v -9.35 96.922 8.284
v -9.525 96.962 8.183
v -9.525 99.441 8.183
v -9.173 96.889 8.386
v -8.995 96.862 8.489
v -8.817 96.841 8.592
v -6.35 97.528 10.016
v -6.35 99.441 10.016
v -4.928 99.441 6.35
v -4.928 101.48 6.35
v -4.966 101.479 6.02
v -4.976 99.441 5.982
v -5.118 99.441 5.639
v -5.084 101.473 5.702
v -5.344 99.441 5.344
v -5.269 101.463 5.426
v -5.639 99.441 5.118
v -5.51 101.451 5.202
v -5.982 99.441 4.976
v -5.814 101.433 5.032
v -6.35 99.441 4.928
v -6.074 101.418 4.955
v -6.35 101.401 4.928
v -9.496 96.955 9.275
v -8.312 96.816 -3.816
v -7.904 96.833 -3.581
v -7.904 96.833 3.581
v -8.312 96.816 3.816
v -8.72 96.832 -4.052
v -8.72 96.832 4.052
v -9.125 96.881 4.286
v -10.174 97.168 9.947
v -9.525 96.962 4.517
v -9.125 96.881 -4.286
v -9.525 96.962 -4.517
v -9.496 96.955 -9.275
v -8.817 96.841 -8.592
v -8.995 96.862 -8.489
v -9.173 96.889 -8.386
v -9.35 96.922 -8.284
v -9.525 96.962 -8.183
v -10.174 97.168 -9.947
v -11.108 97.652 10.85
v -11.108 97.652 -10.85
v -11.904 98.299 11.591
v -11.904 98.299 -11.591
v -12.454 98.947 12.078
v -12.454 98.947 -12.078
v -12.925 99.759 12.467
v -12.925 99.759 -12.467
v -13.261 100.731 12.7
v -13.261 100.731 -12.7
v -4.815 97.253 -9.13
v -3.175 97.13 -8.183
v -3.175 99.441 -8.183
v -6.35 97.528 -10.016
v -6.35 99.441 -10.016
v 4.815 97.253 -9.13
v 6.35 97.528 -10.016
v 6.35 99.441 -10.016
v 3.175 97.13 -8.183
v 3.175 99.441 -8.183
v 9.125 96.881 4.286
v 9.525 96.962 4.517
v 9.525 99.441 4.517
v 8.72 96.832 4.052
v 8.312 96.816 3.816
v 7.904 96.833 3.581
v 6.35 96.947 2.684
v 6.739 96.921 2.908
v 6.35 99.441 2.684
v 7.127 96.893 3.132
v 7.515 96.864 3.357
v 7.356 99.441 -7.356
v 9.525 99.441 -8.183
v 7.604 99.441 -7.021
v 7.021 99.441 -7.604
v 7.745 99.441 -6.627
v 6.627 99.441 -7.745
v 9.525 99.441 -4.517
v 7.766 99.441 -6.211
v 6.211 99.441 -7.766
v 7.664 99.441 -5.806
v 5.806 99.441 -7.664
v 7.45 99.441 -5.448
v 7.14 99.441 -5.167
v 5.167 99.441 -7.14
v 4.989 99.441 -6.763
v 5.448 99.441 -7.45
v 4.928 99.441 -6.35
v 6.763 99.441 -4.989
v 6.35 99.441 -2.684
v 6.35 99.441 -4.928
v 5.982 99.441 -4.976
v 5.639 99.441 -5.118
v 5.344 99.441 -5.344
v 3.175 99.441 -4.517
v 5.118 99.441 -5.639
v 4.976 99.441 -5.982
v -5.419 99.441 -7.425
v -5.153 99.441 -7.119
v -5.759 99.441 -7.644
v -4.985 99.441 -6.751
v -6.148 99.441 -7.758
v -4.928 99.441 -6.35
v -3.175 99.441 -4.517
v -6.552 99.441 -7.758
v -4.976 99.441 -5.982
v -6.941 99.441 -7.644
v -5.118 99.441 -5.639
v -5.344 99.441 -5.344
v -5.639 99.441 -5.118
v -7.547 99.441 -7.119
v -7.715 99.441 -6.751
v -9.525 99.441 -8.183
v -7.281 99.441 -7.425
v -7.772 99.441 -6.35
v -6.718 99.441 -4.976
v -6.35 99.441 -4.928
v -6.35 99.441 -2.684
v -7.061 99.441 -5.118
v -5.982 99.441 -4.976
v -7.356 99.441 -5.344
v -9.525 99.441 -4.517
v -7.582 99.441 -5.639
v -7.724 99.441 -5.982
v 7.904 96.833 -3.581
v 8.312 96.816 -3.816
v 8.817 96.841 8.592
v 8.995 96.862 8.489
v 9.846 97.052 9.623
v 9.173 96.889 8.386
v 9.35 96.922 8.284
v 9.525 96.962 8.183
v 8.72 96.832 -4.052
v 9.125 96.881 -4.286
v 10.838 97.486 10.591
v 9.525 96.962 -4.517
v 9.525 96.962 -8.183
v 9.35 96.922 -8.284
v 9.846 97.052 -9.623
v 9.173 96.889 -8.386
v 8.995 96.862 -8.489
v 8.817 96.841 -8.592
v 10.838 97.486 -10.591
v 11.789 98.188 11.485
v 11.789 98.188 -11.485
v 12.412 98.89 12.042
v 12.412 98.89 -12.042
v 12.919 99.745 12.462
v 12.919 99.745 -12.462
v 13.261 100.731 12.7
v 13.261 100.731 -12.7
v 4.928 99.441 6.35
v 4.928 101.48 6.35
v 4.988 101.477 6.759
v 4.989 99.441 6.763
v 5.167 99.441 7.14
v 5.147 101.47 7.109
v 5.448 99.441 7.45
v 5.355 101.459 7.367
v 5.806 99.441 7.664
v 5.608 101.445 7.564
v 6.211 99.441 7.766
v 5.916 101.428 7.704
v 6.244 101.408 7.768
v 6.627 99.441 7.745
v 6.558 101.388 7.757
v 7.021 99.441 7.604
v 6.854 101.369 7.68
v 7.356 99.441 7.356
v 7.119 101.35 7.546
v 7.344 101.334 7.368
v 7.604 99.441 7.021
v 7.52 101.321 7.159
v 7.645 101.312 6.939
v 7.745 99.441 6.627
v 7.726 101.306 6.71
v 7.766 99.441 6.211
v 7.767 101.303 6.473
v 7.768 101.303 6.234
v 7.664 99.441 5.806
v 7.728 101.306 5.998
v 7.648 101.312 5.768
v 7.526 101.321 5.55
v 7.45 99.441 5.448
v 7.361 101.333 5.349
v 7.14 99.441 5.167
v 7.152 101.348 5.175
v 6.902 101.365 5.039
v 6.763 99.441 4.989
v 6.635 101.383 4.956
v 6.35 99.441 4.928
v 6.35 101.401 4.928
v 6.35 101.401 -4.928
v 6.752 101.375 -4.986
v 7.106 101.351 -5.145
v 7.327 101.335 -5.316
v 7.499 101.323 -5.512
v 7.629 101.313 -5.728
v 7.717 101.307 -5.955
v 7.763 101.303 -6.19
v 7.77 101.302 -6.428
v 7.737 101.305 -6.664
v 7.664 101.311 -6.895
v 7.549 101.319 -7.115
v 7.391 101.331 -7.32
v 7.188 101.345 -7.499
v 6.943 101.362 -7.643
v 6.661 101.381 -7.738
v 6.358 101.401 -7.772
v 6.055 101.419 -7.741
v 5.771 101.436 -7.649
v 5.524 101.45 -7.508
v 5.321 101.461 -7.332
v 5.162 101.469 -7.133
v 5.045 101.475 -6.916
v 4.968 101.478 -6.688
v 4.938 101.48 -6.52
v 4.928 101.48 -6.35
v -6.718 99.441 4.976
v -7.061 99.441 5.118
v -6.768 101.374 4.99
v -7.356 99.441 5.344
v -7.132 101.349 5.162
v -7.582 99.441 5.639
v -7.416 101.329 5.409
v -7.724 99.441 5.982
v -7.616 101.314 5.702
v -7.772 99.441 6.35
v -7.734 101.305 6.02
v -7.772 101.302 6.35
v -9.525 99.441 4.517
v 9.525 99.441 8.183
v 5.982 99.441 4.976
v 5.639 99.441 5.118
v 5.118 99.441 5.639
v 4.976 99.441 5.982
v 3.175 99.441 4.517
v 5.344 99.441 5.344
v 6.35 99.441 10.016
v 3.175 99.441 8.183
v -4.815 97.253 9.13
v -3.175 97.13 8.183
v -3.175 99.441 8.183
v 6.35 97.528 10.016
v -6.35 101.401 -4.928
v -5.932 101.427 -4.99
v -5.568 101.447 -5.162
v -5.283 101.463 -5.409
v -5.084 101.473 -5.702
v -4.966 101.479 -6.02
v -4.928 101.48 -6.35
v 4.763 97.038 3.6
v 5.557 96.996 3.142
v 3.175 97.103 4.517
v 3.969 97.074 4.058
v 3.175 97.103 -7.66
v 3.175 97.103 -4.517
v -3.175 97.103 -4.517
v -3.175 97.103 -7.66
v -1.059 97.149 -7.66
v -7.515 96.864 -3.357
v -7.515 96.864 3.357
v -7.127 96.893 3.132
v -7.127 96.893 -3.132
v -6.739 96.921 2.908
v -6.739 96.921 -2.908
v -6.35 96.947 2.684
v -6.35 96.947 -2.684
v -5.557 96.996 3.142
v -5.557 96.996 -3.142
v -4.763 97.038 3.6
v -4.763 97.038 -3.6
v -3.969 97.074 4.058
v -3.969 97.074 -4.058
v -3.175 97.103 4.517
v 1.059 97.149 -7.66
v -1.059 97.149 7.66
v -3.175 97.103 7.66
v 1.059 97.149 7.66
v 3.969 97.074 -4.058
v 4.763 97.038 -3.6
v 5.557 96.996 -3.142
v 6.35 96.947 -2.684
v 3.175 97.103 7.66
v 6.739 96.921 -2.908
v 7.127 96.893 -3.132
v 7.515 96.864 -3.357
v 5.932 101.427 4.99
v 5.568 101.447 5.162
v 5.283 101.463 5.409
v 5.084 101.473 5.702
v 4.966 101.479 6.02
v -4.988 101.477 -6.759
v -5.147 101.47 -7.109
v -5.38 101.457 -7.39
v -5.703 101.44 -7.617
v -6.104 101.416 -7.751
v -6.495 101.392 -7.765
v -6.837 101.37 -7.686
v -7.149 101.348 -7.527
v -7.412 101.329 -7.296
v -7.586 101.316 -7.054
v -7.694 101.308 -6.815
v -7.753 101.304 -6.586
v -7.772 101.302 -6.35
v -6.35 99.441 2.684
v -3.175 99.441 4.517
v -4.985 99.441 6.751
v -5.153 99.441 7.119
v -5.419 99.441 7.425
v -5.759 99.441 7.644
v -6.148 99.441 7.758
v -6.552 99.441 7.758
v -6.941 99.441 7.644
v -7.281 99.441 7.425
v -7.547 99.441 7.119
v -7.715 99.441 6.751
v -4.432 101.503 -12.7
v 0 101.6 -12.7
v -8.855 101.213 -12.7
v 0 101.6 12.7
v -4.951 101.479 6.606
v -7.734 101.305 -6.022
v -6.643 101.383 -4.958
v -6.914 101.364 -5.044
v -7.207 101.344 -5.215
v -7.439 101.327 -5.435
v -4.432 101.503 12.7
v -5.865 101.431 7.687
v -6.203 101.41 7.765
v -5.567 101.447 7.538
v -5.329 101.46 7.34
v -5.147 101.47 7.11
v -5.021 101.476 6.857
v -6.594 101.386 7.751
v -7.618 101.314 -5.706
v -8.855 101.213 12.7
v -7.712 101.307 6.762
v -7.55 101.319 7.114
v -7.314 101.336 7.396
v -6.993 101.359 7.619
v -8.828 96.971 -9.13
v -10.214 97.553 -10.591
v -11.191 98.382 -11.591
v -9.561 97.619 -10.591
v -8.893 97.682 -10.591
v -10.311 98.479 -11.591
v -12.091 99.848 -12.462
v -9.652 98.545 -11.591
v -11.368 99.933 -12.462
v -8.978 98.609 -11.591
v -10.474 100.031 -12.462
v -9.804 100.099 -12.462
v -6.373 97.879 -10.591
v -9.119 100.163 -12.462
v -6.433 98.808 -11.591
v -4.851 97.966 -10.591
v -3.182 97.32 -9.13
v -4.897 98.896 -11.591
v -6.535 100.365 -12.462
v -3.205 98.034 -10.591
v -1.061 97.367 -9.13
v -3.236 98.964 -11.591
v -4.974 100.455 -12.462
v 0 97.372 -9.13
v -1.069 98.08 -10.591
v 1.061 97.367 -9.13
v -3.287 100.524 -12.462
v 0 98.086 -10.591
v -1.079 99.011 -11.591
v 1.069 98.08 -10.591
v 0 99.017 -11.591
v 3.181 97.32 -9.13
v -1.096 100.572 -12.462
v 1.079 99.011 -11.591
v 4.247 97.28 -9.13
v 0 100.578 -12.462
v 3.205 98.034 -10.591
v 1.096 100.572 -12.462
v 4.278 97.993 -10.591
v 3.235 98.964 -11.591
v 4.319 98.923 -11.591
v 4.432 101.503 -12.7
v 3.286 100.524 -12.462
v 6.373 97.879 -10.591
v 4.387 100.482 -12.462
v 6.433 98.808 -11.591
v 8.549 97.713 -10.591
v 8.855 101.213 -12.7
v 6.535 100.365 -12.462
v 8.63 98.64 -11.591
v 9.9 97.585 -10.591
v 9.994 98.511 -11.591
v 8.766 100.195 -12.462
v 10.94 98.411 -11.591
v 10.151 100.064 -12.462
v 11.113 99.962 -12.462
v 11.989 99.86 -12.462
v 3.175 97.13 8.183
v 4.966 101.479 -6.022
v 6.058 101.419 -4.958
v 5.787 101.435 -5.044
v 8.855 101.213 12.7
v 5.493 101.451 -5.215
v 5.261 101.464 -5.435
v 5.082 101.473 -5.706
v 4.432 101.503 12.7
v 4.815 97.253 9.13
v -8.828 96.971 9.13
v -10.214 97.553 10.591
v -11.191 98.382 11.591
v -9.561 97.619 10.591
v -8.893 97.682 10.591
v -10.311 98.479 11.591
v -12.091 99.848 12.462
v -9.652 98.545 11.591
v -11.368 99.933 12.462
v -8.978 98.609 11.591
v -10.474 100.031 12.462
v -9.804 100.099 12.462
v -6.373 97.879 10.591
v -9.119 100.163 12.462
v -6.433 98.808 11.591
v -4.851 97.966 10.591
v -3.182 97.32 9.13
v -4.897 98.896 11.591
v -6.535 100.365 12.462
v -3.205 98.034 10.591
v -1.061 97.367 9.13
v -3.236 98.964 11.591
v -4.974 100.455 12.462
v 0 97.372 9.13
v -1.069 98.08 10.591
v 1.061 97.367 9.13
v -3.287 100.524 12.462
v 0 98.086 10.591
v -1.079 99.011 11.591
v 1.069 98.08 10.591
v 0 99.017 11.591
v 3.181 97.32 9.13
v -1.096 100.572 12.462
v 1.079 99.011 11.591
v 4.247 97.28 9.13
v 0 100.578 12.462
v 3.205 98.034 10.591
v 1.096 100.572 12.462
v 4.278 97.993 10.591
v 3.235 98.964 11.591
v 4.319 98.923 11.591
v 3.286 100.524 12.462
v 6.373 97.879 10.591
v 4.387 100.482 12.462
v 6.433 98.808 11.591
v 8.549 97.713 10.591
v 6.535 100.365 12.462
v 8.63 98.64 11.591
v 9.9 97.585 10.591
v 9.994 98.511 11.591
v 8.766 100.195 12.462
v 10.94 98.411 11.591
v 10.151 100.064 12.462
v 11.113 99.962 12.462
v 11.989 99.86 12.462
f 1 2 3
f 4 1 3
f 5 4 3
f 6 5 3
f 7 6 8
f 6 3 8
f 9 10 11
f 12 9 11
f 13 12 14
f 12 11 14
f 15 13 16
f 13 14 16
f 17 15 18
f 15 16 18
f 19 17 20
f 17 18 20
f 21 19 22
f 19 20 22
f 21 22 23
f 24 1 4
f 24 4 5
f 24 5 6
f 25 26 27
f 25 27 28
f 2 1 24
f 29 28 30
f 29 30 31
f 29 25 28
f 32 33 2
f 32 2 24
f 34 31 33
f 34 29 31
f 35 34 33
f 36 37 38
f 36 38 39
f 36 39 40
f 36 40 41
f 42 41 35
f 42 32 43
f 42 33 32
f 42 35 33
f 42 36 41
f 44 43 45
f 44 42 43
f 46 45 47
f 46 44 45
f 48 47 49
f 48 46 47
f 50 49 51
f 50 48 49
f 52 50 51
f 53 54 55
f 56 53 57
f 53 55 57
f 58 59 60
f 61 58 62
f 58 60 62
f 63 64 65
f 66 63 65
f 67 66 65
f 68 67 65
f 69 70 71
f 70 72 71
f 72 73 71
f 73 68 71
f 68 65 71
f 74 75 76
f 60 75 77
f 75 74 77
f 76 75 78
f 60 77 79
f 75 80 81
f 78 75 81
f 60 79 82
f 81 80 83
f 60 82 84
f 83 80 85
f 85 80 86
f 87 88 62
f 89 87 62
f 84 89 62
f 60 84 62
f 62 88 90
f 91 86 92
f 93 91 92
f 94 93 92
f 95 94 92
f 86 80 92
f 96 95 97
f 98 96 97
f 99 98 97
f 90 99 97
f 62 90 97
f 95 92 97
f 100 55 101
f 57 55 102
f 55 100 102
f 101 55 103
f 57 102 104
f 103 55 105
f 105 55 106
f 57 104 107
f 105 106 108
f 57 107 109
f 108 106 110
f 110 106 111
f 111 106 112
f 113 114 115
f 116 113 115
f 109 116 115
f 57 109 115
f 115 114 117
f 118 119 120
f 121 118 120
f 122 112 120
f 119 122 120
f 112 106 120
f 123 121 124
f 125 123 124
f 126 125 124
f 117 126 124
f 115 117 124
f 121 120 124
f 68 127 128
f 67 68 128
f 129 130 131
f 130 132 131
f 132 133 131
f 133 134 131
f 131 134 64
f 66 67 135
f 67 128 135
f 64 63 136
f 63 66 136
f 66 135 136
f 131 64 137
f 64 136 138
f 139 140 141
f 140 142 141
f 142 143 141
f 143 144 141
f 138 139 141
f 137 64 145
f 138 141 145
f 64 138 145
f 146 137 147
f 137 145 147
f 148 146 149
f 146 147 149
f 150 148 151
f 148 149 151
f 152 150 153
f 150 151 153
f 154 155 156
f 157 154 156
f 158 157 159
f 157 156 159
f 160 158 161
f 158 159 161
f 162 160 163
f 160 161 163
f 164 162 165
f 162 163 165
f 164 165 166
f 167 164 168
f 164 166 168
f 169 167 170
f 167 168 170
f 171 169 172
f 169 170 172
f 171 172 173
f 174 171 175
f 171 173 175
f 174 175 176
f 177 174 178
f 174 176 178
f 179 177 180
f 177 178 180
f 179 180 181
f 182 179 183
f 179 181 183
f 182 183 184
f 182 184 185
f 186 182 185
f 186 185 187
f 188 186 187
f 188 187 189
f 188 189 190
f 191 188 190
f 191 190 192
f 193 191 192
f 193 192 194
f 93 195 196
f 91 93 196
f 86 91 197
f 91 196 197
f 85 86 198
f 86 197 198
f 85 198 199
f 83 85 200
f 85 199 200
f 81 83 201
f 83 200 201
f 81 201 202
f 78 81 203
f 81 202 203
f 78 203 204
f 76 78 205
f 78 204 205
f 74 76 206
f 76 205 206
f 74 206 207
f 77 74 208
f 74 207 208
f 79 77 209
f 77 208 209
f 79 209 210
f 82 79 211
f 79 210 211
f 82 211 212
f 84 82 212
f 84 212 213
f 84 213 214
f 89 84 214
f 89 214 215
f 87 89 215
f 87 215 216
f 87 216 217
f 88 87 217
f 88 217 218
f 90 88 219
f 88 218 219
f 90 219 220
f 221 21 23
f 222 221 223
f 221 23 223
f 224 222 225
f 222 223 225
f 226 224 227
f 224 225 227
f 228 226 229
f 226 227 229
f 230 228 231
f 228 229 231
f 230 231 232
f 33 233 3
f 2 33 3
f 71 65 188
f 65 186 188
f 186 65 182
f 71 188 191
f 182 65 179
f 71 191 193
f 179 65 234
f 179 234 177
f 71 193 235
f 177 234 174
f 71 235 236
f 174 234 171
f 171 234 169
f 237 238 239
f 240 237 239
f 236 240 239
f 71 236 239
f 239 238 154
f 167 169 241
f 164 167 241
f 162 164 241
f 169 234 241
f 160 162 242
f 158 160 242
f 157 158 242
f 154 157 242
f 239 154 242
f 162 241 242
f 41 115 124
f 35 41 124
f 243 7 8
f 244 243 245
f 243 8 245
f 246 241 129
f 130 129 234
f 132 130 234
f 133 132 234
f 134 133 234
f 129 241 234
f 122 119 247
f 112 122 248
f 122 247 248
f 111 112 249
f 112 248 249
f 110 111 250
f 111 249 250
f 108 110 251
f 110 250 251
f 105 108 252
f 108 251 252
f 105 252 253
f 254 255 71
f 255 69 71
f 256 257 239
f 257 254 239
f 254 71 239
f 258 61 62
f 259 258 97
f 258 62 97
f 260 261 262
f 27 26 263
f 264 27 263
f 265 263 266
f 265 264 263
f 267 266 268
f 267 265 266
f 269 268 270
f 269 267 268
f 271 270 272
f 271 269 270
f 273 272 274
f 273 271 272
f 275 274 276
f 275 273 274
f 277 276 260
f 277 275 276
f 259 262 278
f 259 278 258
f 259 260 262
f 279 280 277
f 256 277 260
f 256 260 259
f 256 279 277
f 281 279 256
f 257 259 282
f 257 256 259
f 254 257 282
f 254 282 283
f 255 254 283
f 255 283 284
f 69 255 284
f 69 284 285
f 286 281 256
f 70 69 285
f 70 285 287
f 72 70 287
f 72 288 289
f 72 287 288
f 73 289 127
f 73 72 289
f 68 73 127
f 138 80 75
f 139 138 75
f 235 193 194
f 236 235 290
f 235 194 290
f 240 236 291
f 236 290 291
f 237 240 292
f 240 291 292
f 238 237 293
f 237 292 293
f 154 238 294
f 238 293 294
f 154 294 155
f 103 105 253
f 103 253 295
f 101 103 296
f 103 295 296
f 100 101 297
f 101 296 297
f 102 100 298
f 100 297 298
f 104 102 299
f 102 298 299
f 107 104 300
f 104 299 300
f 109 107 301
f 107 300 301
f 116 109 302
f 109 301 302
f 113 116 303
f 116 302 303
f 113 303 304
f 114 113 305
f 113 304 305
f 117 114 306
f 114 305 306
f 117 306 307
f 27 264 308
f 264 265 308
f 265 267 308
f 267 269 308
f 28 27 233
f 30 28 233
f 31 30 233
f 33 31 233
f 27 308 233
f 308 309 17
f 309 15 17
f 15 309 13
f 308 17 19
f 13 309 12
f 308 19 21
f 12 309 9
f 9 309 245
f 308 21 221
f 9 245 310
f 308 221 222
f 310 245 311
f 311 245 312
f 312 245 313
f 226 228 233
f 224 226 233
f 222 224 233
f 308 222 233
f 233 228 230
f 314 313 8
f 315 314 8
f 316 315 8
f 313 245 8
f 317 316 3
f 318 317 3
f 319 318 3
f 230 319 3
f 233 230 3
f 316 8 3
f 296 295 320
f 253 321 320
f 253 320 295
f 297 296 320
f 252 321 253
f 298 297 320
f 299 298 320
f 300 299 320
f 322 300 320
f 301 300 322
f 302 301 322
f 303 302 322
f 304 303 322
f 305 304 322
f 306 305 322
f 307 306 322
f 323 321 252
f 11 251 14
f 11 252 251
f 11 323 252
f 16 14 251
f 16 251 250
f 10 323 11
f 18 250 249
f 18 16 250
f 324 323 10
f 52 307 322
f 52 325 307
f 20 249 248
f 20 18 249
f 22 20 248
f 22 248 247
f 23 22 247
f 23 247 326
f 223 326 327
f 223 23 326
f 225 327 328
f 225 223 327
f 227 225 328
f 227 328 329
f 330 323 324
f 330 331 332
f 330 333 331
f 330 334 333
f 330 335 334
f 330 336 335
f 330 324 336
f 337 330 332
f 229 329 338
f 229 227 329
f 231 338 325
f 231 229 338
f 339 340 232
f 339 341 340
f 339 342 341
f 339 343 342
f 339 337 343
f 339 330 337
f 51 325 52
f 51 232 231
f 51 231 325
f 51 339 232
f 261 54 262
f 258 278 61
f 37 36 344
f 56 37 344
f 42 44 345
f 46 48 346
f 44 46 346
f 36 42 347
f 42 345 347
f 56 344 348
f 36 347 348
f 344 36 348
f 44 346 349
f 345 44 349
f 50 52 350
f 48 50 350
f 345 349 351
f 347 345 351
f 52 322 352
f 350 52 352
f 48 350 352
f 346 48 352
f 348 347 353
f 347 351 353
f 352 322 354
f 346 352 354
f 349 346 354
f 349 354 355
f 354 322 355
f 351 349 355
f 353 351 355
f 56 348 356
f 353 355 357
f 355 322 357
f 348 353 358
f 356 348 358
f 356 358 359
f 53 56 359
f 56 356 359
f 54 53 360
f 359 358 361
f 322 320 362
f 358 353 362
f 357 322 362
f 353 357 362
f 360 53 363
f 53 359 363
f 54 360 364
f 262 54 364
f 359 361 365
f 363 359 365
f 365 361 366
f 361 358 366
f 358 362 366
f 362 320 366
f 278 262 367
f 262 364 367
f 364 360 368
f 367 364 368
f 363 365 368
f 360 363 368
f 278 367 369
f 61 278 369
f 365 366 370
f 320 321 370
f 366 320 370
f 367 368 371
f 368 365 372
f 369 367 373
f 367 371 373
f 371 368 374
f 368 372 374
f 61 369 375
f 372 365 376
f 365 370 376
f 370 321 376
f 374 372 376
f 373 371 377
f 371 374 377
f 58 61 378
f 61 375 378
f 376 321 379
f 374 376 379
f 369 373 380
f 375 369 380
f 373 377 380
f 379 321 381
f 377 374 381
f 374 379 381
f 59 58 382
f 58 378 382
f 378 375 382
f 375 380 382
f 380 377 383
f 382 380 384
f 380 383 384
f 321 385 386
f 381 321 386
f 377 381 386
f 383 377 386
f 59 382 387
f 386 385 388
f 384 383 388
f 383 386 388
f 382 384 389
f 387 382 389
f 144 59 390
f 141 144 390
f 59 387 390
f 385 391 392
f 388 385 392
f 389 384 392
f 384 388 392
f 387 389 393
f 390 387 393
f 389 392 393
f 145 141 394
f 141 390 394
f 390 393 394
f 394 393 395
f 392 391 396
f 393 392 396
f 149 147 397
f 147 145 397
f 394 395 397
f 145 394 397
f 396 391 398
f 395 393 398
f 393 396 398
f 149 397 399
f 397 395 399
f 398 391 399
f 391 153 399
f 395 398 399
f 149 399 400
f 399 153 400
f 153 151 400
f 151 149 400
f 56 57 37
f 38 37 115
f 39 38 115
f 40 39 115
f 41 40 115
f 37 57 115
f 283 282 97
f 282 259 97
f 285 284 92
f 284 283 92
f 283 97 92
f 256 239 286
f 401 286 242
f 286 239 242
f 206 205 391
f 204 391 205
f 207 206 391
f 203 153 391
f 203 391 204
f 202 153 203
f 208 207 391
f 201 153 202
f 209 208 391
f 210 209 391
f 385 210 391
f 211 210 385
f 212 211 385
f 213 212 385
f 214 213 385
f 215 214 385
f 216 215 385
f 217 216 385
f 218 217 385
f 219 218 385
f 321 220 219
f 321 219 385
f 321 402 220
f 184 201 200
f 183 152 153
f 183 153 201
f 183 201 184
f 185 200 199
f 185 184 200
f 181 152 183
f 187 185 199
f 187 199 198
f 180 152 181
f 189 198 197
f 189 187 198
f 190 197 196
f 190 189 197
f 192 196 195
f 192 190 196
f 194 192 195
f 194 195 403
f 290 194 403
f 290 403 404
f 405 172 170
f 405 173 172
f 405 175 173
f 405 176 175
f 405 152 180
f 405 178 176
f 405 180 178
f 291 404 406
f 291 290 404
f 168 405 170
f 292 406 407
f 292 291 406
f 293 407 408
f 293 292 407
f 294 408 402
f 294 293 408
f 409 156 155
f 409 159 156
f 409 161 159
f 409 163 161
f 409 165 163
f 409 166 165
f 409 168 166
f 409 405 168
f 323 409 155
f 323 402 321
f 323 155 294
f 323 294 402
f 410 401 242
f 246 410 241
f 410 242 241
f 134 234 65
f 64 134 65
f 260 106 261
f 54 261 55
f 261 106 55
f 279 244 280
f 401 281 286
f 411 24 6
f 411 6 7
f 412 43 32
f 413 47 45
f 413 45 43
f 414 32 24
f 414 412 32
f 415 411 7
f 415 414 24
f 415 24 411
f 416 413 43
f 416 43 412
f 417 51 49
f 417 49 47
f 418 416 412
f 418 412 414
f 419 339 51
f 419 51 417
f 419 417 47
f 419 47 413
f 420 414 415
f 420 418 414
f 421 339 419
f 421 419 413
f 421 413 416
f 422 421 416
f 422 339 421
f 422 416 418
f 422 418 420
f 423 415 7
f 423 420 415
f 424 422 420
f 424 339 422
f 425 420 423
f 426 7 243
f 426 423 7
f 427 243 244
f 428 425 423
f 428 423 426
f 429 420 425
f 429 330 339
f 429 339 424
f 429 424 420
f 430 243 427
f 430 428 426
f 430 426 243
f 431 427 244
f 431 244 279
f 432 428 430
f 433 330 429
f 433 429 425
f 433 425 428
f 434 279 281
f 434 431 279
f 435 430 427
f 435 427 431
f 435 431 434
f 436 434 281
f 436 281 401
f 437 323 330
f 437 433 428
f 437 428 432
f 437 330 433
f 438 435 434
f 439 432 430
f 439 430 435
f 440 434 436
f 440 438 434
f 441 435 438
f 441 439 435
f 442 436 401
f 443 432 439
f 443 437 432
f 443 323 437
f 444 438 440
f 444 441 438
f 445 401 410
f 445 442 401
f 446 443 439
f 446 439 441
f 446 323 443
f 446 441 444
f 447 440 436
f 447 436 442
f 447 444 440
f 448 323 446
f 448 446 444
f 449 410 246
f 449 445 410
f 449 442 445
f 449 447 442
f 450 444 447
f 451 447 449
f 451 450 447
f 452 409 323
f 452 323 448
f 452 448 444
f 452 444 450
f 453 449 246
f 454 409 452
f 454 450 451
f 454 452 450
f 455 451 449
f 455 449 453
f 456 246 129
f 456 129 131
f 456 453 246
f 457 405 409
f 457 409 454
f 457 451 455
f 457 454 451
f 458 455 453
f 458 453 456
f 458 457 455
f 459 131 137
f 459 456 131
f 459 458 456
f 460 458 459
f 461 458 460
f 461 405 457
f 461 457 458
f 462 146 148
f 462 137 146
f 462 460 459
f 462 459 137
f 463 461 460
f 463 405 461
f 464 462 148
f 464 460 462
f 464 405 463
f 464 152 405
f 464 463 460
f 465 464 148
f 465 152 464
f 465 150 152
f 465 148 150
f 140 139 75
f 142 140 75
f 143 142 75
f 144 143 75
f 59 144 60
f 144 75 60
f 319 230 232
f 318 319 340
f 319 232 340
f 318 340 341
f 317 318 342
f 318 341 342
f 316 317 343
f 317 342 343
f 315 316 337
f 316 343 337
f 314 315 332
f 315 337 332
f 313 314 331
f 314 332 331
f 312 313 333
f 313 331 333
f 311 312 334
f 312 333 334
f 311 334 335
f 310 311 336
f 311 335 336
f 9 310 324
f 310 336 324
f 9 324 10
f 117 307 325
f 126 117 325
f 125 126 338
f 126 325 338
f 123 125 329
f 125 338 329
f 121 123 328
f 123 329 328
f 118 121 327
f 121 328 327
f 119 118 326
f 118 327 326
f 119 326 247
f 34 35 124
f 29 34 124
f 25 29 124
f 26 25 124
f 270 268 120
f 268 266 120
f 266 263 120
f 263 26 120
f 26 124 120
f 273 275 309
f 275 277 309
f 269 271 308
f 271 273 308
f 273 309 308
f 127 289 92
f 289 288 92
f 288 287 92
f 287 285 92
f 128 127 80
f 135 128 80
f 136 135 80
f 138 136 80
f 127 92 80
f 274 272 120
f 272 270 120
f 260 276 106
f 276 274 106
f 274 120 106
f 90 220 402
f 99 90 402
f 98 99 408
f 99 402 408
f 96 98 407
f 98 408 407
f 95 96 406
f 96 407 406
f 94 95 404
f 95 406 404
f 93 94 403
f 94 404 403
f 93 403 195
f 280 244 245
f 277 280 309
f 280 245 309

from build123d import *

# Parameters (mm, degrees)
F1_DEPTH    = 12.7
F6_DEPTH    = 25.4
F7_T1_DEPTH = 49.4232912098
F7_T4_ANGLE = 29.8619681209
F7_T6_ANGLE = 29.8619681209
F8_START    = -2.159
F8_DEPTH    = 23.241
F9_DEPTH    = 25.4


# Not quite as in the source:
# - a fillet or chamfer that OpenCascade refuses, or shapes differently, is made with other operations: its cross-section is extruded or revolved along the edge and cut away or added


with BuildPart() as f1:
    # F0 (on Top) → F1 (new body, symmetric)
    with BuildSketch(Plane.XY):
        with BuildLine():
            ThreePointArc((0, 101.6), (-6.6449579298, 101.382466601), (-13.2614611296, 100.7307979156))
            Line((-13.2614611296, 100.7307979156), (-12.6812722051, 96.3238255068))
            ThreePointArc((-12.6812722051, 96.3238255068), (-6.3542410204, 96.9469836872), (0, 97.155))
            Line((0, 97.155), (0, 101.6))
        make_face()
        with BuildLine():
            Line((12.6812722051, 96.3238255068), (13.2614611296, 100.7307979156))
            ThreePointArc((13.2614611296, 100.7307979156), (6.6449579298, 101.382466601), (0, 101.6))
            Line((0, 101.6), (0, 97.155))
            ThreePointArc((0, 97.155), (6.3542410204, 96.9469836872), (12.6812722051, 96.3238255068))
        make_face()
    extrude(amount=F1_DEPTH, both=True)

    # F5 (on line) → F6 (cut)
    with BuildSketch(Plane(origin=(0, 101.6, 0), x_dir=(-1, 0, 0), z_dir=(0, 1, 0))):
        with BuildLine():
            Line((6.35, -6.35), (4.9276, -6.35))
            ThreePointArc((4.9276, -6.35), (6.35, -7.7724), (7.7724, -6.35))
            ThreePointArc((7.7724, -6.35), (7.3557886856, -5.3442113144), (6.35, -4.9276))
            Line((6.35, -4.9276), (6.35, -6.35))
        make_face()
        with BuildLine():
            ThreePointArc((6.35, -4.9276), (5.3442113144, -5.3442113144), (4.9276, -6.35))
            Line((4.9276, -6.35), (6.35, -6.35))
            Line((6.35, -6.35), (6.35, -4.9276))
        make_face()
        with BuildLine():
            Line((-4.9276, -6.35), (-6.35, -6.35))
            Line((-6.35, -6.35), (-6.35, -4.9276))
            ThreePointArc((-6.35, -4.9276), (-7.3557886856, -7.3557886856), (-4.9276, -6.35))
        make_face()
        with BuildLine():
            Line((-6.35, -4.9276), (-6.35, -6.35))
            Line((-6.35, -6.35), (-4.9276, -6.35))
            ThreePointArc((-4.9276, -6.35), (-5.3442113144, -5.3442113144), (-6.35, -4.9276))
        make_face()
        with BuildLine():
            Line((6.35, 6.35), (6.35, 4.9276))
            ThreePointArc((6.35, 4.9276), (7.3557886856, 5.3442113144), (7.7724, 6.35))
            ThreePointArc((7.7724, 6.35), (6.35, 7.7724), (4.9276, 6.35))
            Line((4.9276, 6.35), (6.35, 6.35))
        make_face()
        with BuildLine():
            ThreePointArc((4.9276, 6.35), (5.3442113144, 5.3442113144), (6.35, 4.9276))
            Line((6.35, 4.9276), (6.35, 6.35))
            Line((6.35, 6.35), (4.9276, 6.35))
        make_face()
        with BuildLine():
            ThreePointArc((-4.9276, 6.35), (-7.3557886856, 7.3557886856), (-6.35, 4.9276))
            Line((-6.35, 4.9276), (-6.35, 6.35))
            Line((-6.35, 6.35), (-4.9276, 6.35))
        make_face()
        with BuildLine():
            Line((-6.35, 6.35), (-6.35, 4.9276))
            ThreePointArc((-6.35, 4.9276), (-5.3442113144, 5.3442113144), (-4.9276, 6.35))
            Line((-4.9276, 6.35), (-6.35, 6.35))
        make_face()
    extrude(amount=-F6_DEPTH, mode=Mode.SUBTRACT)

    # F7: fillet of radius 5.08 on 4 edges, made by hand

    # F7_s2 → F7_t1 (cut)
    with BuildSketch(Plane.XY.offset(-24.7116456049)):
        with BuildLine():
            ThreePointArc((7.9036679621, 96.8329802172), (11.3054660928, 97.7882158705), (13.2614611296, 100.7307979156))
            Line((13.2614611296, 100.7307979156), (12.6812722051, 96.3238255068))
            ThreePointArc((12.6812722051, 96.3238255068), (10.2956180024, 96.6079410553), (7.9036679621, 96.8329802172))
        make_face()
        with BuildLine():
            ThreePointArc((-7.9036679621, 96.8329802172), (-11.3054660928, 97.7882158705), (-13.2614611296, 100.7307979156))
            Line((-13.2614611296, 100.7307979156), (-12.6812722051, 96.3238255068))
            ThreePointArc((-12.6812722051, 96.3238255068), (-10.2956180024, 96.6079410553), (-7.9036679621, 96.8329802172))
        make_face()
    extrude(amount=F7_T1_DEPTH, mode=Mode.SUBTRACT)

    # F7_s3 → F7_t4 (revolve, cut)
    with BuildSketch(Plane(origin=(0, 0, 0), x_dir=(0, 0, 1), z_dir=(-0.9662368873, -0.2576553465, 0))):
        with BuildLine():
            ThreePointArc((7.6598437524, 97.155), (11.0199479175, 98.425), (12.7, 101.6))
            Line((12.7, 101.6), (12.7, 97.155))
            Line((12.7, 97.155), (7.6598437524, 97.155))
        make_face()
    revolve(axis=Axis((0, 0, 12.7), (0, 0, -1)), revolution_arc=F7_T4_ANGLE, mode=Mode.SUBTRACT)

    # F7_s5 → F7_t6 (revolve, cut)
    with BuildSketch(Plane(origin=(0, 0, 0), x_dir=(0, 0, 1), z_dir=(-0.9662368873, -0.2576553465, 0))):
        with BuildLine():
            ThreePointArc((-7.6598437524, 97.155), (-11.0199479175, 98.425), (-12.7, 101.6))
            Line((-12.7, 101.6), (-12.7, 97.155))
            Line((-12.7, 97.155), (-7.6598437524, 97.155))
        make_face()
    revolve(axis=Axis((0, 0, -12.7), (0, 0, -1)), revolution_arc=F7_T6_ANGLE, mode=Mode.SUBTRACT)

    # F5 (on line) → F8 (cut)
    with BuildSketch(Plane(origin=(0, 101.6, 0), x_dir=(-1, 0, 0), z_dir=(0, 1, 0)).offset(F8_START)):
        with BuildLine():
            Line((6.35, 4.9276), (6.35, 2.6838257906))
            Line((6.35, 2.6838257906), (9.525, 4.5169128953))
            Line((9.525, 4.5169128953), (9.525, 8.1830871047))
            Line((9.525, 8.1830871047), (6.35, 10.0161742094))
            Line((6.35, 10.0161742094), (3.175, 8.1830871047))
            Line((3.175, 8.1830871047), (3.175, 6.35))
            Line((3.175, 6.35), (4.9276, 6.35))
            ThreePointArc((4.9276, 6.35), (6.35, 7.7724), (7.7724, 6.35))
            ThreePointArc((7.7724, 6.35), (7.3557886856, 5.3442113144), (6.35, 4.9276))
        make_face()
        with BuildLine():
            Line((3.175, 4.5169128953), (6.35, 2.6838257906))
            Line((6.35, 2.6838257906), (6.35, 4.9276))
            ThreePointArc((6.35, 4.9276), (5.3442113144, 5.3442113144), (4.9276, 6.35))
            Line((4.9276, 6.35), (3.175, 6.35))
            Line((3.175, 6.35), (3.175, 4.5169128953))
        make_face()
        with BuildLine():
            Line((4.9276, -6.35), (3.175, -6.35))
            Line((3.175, -6.35), (3.175, -8.1830871047))
            Line((3.175, -8.1830871047), (6.35, -10.0161742094))
            Line((6.35, -10.0161742094), (9.525, -8.1830871047))
            Line((9.525, -8.1830871047), (9.525, -4.5169128953))
            Line((9.525, -4.5169128953), (6.35, -2.6838257906))
            Line((6.35, -2.6838257906), (6.35, -4.9276))
            ThreePointArc((6.35, -4.9276), (7.3557886856, -5.3442113144), (7.7724, -6.35))
            ThreePointArc((7.7724, -6.35), (6.35, -7.7724), (4.9276, -6.35))
        make_face()
        with BuildLine():
            Line((3.175, -4.5169128953), (3.175, -6.35))
            Line((3.175, -6.35), (4.9276, -6.35))
            ThreePointArc((4.9276, -6.35), (5.3442113144, -5.3442113144), (6.35, -4.9276))
            Line((6.35, -4.9276), (6.35, -2.6838257906))
            Line((6.35, -2.6838257906), (3.175, -4.5169128953))
        make_face()
        with BuildLine():
            Line((-3.175, -6.35), (-4.9276, -6.35))
            ThreePointArc((-4.9276, -6.35), (-7.3557886856, -7.3557886856), (-6.35, -4.9276))
            Line((-6.35, -4.9276), (-6.35, -2.6838257906))
            Line((-6.35, -2.6838257906), (-9.525, -4.5169128953))
            Line((-9.525, -4.5169128953), (-9.525, -8.1830871047))
            Line((-9.525, -8.1830871047), (-6.35, -10.0161742094))
            Line((-6.35, -10.0161742094), (-3.175, -8.1830871047))
            Line((-3.175, -8.1830871047), (-3.175, -6.35))
        make_face()
        with BuildLine():
            ThreePointArc((-6.35, -4.9276), (-5.3442113144, -5.3442113144), (-4.9276, -6.35))
            Line((-4.9276, -6.35), (-3.175, -6.35))
            Line((-3.175, -6.35), (-3.175, -4.5169128953))
            Line((-3.175, -4.5169128953), (-6.35, -2.6838257906))
            Line((-6.35, -2.6838257906), (-6.35, -4.9276))
        make_face()
        with BuildLine():
            Line((-6.35, 4.9276), (-6.35, 2.6838257906))
            Line((-6.35, 2.6838257906), (-3.175, 4.5169128953))
            Line((-3.175, 4.5169128953), (-3.175, 6.35))
            Line((-3.175, 6.35), (-4.9276, 6.35))
            ThreePointArc((-4.9276, 6.35), (-5.3442113144, 5.3442113144), (-6.35, 4.9276))
        make_face()
        with BuildLine():
            Line((-9.525, 4.5169128953), (-6.35, 2.6838257906))
            Line((-6.35, 2.6838257906), (-6.35, 4.9276))
            ThreePointArc((-6.35, 4.9276), (-7.3557886856, 7.3557886856), (-4.9276, 6.35))
            Line((-4.9276, 6.35), (-3.175, 6.35))
            Line((-3.175, 6.35), (-3.175, 8.1830871047))
            Line((-3.175, 8.1830871047), (-6.35, 10.0161742094))
            Line((-6.35, 10.0161742094), (-9.525, 8.1830871047))
            Line((-9.525, 8.1830871047), (-9.525, 4.5169128953))
        make_face()
    extrude(amount=-F8_DEPTH, mode=Mode.SUBTRACT)

    # F5 (on line) → F9 (cut)
    with BuildSketch(Plane(origin=(0, 101.6, 0), x_dir=(-1, 0, 0), z_dir=(0, 1, 0))):
        with BuildLine():
            ThreePointArc((-4.9276, 6.35), (-7.3557886856, 7.3557886856), (-6.35, 4.9276))
            Line((-6.35, 4.9276), (-6.35, 6.35))
            Line((-6.35, 6.35), (-4.9276, 6.35))
        make_face()
        with BuildLine():
            Line((-6.35, 6.35), (-6.35, 4.9276))
            ThreePointArc((-6.35, 4.9276), (-5.3442113144, 5.3442113144), (-4.9276, 6.35))
            Line((-4.9276, 6.35), (-6.35, 6.35))
        make_face()
    extrude(amount=-F9_DEPTH, mode=Mode.SUBTRACT)


solid = f1.part
